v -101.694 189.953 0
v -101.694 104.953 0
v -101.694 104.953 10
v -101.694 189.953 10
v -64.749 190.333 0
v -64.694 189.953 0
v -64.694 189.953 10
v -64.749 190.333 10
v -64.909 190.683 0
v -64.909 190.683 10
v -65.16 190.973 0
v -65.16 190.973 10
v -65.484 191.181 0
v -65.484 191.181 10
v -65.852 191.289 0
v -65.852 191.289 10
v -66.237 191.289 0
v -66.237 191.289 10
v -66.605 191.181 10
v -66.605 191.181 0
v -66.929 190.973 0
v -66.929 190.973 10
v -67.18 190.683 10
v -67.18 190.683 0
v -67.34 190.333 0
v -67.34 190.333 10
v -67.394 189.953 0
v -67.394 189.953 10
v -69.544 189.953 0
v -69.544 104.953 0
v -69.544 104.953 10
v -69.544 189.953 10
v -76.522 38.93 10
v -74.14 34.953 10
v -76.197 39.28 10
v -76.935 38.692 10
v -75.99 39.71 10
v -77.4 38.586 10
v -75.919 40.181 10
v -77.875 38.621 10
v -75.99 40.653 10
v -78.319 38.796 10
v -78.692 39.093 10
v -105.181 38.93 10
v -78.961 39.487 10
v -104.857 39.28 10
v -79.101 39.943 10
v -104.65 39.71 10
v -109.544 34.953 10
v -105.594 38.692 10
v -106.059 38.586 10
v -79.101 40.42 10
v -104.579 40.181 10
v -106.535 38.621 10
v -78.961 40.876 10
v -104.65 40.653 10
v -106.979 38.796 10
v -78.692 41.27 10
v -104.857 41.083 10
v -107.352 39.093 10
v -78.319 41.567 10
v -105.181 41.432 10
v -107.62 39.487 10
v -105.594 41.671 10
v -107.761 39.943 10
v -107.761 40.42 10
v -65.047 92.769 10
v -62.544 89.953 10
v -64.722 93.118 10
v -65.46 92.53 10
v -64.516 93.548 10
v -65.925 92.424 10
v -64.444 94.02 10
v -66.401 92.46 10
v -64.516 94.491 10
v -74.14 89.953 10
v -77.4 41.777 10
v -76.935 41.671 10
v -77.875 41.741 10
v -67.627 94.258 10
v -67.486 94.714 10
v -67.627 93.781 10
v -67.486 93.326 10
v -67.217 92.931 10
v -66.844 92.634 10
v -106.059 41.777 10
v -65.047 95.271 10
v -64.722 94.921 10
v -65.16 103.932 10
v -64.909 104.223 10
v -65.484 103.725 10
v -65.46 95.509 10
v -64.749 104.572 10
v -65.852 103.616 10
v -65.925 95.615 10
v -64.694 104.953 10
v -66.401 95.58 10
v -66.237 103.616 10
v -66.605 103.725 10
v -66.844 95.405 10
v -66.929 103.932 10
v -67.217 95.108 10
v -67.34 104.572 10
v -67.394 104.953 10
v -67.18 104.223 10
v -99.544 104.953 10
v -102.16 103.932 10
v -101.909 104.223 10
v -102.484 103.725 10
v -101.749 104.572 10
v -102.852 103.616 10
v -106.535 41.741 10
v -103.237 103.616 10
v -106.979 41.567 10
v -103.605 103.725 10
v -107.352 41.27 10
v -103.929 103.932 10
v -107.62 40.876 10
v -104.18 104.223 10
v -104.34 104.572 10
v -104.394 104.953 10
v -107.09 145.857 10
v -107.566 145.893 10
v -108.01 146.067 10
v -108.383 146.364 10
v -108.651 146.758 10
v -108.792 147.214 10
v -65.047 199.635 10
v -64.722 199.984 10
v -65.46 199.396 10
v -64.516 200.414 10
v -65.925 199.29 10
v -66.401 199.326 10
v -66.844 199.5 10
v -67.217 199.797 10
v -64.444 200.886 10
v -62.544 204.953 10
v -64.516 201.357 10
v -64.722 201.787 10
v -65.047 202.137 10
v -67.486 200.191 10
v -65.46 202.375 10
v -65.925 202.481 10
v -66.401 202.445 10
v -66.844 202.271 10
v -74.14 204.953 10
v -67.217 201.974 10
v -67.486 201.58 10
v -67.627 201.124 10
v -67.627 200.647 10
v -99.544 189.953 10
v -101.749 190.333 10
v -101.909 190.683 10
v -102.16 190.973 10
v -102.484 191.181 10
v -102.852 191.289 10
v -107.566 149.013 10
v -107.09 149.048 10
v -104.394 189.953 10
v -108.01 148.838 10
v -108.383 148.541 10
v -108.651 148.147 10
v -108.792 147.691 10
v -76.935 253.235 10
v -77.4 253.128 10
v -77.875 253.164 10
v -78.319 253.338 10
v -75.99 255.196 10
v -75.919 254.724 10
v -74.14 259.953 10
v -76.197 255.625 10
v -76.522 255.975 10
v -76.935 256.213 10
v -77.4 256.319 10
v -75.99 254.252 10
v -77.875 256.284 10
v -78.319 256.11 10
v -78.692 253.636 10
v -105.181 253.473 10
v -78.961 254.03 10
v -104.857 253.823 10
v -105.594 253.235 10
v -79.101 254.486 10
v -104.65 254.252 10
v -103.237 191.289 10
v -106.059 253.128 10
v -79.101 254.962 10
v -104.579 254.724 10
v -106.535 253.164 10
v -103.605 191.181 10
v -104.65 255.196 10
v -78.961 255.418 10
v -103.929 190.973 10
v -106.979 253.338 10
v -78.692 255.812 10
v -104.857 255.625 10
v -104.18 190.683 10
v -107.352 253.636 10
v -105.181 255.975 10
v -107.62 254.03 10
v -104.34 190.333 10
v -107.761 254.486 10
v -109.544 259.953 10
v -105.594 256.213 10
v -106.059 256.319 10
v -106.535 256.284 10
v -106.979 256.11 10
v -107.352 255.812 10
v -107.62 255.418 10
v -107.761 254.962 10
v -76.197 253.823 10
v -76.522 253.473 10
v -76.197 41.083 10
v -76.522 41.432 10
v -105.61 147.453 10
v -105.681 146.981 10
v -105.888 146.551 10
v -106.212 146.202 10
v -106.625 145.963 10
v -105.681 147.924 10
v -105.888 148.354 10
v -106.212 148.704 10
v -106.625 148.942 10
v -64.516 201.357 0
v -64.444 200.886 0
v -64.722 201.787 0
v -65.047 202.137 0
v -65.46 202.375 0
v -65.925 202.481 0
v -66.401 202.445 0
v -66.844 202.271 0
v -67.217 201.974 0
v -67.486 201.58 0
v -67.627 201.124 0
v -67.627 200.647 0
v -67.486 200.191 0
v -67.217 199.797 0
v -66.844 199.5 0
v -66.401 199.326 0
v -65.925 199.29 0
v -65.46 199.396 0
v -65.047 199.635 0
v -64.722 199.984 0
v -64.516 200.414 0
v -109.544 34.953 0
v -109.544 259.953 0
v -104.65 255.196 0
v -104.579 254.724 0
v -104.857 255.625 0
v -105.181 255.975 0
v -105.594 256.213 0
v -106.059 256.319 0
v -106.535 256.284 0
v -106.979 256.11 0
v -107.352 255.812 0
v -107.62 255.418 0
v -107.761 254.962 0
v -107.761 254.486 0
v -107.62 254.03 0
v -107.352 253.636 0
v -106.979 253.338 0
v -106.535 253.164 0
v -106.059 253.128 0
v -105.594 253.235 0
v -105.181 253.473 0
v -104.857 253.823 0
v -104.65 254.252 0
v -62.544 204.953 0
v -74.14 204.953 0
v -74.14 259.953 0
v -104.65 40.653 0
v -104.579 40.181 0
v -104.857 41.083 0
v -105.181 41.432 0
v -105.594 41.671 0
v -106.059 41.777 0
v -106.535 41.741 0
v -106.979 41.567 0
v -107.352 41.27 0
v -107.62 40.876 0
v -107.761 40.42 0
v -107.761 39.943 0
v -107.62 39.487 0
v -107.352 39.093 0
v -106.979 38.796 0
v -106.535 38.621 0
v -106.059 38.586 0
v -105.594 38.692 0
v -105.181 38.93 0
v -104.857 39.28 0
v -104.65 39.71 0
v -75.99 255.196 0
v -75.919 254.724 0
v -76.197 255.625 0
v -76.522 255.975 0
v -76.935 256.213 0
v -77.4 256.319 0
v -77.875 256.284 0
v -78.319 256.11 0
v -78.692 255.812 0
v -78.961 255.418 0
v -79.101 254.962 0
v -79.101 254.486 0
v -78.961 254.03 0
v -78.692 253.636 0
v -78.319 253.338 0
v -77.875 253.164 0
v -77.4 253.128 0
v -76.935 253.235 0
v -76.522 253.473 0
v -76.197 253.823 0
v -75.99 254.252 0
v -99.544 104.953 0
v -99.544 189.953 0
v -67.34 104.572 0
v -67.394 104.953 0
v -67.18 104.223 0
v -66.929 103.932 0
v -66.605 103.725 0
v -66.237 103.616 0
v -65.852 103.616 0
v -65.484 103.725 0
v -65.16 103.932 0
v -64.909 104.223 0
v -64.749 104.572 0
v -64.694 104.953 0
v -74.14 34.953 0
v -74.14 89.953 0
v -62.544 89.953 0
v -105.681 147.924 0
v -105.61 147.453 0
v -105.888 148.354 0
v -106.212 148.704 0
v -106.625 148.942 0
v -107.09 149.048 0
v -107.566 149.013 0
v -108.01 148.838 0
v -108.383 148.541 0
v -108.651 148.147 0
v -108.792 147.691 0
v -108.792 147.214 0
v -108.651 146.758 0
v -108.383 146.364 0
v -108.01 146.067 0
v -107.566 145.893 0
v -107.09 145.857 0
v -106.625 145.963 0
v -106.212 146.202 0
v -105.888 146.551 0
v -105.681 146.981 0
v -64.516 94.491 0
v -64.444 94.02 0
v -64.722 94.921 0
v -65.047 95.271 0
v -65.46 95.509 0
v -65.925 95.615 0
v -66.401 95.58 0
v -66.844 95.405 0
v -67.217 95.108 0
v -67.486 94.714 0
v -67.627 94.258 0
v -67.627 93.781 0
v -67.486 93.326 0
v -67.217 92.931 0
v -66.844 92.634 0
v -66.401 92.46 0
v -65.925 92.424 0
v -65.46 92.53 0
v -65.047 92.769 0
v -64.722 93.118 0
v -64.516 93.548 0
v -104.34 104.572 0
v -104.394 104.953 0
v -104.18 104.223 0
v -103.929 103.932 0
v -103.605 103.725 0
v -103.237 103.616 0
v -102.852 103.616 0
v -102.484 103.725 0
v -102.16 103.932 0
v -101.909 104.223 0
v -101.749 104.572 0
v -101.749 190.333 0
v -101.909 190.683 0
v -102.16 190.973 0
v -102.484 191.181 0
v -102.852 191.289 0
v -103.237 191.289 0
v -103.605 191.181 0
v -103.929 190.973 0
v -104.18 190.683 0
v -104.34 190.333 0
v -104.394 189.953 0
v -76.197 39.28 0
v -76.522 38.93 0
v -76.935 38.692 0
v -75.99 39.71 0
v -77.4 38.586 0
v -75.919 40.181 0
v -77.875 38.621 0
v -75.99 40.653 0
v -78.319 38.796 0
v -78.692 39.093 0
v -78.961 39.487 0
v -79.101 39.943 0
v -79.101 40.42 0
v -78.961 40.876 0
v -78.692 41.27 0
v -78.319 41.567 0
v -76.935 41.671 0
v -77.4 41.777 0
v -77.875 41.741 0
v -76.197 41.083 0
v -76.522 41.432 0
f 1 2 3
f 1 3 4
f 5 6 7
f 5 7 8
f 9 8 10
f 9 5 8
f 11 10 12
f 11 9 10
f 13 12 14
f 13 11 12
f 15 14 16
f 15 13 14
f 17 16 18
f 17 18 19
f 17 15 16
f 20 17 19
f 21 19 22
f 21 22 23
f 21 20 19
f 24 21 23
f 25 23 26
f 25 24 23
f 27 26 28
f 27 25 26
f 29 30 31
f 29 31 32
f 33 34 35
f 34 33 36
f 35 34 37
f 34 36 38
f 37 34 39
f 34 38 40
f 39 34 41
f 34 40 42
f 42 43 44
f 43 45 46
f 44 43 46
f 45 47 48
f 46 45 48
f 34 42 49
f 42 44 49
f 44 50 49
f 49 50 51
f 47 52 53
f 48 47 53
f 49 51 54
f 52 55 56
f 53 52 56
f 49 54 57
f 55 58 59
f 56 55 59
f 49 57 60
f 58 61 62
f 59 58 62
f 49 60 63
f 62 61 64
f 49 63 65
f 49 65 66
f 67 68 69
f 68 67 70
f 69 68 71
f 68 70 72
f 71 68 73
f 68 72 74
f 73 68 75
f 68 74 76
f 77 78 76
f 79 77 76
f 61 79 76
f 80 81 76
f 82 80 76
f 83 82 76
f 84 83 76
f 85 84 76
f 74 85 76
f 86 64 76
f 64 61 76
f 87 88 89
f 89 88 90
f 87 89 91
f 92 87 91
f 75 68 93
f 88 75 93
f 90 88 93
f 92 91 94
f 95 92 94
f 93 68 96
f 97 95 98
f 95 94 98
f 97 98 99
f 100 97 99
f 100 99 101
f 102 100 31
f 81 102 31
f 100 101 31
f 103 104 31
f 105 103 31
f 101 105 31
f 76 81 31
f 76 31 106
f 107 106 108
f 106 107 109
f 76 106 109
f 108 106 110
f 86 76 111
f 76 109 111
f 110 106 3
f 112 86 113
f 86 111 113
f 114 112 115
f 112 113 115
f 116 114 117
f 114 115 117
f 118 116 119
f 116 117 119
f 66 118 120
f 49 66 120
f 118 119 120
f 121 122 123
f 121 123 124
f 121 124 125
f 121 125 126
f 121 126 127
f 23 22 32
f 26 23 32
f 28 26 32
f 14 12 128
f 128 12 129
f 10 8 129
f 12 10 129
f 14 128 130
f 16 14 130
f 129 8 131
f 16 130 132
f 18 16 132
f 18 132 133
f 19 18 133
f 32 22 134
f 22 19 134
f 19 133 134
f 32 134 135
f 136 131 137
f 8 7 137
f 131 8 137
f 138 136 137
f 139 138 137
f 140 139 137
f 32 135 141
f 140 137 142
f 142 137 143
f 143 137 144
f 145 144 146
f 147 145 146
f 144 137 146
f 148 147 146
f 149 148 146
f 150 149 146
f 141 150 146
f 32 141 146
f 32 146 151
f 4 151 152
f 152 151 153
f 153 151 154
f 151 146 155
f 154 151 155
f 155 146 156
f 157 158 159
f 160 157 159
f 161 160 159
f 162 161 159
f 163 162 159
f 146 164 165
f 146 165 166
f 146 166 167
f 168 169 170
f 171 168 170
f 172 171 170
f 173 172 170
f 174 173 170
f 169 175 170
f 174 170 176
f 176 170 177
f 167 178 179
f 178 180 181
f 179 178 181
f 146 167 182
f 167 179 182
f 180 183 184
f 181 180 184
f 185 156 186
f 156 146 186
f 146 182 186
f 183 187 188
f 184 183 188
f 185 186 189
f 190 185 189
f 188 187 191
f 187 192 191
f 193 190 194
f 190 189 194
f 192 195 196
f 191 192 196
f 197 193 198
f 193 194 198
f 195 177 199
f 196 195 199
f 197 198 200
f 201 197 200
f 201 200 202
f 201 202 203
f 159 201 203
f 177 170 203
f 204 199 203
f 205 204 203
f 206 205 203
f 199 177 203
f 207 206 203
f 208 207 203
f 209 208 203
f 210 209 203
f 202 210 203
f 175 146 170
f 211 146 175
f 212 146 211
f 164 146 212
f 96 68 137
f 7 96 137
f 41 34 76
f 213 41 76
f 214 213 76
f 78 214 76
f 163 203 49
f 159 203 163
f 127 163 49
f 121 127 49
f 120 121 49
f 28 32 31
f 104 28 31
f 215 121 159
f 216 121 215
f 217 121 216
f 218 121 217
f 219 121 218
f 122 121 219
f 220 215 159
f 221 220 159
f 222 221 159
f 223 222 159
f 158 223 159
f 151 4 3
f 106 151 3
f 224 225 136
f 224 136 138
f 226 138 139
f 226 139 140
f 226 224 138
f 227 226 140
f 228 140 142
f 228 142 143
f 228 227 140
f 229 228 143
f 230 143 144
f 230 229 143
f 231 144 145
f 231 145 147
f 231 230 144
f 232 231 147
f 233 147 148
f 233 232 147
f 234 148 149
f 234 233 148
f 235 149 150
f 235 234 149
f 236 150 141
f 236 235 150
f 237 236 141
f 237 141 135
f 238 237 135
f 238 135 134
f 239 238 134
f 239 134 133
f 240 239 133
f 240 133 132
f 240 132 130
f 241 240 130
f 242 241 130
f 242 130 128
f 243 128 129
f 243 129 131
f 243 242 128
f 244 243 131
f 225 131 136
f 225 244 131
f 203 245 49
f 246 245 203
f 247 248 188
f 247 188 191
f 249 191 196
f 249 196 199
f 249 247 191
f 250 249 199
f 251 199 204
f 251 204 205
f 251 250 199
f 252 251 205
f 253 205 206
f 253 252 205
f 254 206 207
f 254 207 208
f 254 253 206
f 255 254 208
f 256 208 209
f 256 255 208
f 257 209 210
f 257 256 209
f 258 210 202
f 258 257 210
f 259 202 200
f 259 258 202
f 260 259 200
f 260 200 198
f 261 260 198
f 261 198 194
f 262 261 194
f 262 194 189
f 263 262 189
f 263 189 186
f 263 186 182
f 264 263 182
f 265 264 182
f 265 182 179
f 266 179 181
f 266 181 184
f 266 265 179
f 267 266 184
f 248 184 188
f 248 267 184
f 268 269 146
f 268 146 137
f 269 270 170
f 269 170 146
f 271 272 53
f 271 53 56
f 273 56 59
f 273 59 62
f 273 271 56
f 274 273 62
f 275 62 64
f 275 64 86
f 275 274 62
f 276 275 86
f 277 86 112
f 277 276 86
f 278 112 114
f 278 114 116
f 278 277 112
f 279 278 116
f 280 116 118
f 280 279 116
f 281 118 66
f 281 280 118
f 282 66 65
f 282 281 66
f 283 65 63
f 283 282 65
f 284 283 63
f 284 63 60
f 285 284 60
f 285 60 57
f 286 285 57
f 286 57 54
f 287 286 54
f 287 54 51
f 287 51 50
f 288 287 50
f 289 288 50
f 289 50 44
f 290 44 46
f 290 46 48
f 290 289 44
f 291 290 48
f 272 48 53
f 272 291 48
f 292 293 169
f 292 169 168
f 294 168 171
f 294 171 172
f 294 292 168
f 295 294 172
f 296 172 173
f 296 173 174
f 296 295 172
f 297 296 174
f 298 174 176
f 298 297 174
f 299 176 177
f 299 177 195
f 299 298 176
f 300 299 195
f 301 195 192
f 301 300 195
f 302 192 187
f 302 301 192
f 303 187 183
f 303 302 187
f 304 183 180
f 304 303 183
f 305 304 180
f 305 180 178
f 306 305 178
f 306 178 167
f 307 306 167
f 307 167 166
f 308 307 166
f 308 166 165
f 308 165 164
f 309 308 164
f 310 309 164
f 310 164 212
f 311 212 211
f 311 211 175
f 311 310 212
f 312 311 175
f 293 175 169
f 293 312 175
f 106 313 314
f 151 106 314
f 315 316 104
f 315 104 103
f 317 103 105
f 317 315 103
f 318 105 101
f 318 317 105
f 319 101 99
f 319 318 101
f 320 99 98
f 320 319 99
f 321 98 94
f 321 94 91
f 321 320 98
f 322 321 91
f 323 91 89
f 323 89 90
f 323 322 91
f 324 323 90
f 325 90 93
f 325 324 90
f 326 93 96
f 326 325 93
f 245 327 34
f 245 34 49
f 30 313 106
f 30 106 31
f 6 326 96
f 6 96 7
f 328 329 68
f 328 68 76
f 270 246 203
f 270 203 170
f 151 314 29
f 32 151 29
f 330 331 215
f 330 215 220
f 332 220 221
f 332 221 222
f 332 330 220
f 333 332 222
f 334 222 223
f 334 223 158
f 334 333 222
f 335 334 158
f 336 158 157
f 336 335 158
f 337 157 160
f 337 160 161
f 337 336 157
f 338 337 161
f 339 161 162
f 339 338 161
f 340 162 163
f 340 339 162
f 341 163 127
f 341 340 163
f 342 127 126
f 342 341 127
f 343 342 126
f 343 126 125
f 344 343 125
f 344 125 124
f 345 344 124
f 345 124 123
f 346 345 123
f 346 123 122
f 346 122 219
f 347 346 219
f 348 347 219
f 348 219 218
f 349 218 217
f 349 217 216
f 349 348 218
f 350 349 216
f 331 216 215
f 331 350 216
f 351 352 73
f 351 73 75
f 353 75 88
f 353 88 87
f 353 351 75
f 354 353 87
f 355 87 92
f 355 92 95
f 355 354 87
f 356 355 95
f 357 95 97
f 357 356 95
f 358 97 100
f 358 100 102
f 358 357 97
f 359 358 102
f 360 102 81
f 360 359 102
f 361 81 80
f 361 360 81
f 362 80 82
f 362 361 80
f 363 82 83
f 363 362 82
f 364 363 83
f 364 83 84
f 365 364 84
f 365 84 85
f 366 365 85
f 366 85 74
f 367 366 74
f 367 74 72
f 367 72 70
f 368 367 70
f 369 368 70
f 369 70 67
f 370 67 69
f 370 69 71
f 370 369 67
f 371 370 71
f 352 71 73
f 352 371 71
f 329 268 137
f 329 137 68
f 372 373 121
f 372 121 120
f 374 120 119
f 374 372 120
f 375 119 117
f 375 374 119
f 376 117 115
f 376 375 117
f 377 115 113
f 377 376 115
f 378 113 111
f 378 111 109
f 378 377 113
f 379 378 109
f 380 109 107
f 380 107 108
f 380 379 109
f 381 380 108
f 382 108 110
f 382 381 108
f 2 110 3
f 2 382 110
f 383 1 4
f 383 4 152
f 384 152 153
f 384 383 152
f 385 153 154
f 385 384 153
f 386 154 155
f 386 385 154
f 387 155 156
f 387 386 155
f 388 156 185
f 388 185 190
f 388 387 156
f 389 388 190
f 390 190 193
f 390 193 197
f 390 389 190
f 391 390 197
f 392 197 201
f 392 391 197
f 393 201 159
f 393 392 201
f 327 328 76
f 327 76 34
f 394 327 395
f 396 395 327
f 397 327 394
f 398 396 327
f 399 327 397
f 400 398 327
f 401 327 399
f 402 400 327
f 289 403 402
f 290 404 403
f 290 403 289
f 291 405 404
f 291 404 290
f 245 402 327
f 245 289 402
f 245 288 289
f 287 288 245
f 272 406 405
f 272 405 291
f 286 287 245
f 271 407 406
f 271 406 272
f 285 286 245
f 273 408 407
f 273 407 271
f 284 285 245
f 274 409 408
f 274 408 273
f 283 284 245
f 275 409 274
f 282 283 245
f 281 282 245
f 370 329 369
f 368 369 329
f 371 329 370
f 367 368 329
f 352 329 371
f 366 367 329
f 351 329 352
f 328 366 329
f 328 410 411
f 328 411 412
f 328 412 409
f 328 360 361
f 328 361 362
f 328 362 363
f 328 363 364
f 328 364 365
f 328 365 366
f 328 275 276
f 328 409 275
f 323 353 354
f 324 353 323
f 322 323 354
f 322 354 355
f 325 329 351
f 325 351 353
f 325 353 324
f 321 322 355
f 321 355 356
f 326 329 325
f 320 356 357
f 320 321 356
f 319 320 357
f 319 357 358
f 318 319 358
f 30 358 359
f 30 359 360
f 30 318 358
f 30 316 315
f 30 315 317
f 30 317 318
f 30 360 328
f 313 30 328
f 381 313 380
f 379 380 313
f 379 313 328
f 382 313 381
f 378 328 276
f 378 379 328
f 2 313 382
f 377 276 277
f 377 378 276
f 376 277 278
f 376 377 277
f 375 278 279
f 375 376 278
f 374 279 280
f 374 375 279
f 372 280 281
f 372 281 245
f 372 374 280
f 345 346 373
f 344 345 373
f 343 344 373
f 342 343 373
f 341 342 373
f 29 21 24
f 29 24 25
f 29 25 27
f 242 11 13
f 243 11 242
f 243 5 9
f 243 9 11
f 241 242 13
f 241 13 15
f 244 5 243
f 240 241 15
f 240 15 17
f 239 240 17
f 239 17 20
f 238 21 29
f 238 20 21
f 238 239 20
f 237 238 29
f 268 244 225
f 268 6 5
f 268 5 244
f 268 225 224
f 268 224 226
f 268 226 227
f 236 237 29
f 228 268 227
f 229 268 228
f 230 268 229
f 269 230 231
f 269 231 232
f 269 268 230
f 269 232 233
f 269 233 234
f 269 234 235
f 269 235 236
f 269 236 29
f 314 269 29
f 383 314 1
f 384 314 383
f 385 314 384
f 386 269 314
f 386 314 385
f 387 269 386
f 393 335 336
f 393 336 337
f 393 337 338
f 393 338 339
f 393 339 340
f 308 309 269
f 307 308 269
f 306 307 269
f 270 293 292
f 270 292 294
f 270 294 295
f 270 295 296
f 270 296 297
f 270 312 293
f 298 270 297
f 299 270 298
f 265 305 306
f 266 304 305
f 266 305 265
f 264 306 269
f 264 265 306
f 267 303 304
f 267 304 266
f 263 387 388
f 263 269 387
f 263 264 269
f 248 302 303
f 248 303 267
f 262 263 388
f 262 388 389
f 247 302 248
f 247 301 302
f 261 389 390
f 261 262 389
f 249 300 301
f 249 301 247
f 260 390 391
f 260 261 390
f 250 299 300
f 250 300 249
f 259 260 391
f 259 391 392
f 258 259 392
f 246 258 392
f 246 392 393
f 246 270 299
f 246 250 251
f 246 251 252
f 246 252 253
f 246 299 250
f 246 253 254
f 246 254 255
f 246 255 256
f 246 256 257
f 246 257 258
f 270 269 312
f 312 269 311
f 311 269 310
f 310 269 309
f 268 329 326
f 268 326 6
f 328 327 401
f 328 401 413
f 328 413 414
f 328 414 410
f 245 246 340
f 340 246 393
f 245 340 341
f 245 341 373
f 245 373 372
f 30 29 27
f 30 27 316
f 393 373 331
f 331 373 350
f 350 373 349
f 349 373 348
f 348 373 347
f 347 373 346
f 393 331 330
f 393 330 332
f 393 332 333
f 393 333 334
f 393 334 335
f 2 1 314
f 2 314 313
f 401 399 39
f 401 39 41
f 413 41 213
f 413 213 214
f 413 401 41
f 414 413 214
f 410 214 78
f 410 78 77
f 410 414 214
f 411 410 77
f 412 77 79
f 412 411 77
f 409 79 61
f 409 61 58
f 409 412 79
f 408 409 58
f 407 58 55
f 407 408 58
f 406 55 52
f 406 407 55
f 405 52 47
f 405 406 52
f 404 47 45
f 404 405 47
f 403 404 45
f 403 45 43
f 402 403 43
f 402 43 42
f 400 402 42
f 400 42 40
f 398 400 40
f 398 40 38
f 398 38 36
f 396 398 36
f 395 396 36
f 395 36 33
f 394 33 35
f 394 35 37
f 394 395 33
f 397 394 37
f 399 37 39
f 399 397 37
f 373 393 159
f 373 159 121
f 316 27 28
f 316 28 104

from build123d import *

# Parameters (mm, degrees)
SKETCH4_R           = 1.6
SKETCH4_W           = 30
SKETCH4_H           = 85
BOSS_EXTRUDE6_DEPTH = 10


with BuildPart() as part:
    # Sketch4 → Boss-Extrude6 (new body)
    with BuildSketch(Plane.XY):
        Polygon((-109.544479684, 259.95267573), (-74.140420057, 259.95267573), (-74.140420057, 204.95267573), (-62.544479684, 204.95267573), (-62.544479684, 89.95267573), (-74.140420057, 89.95267573), (-74.140420057, 34.95267573), (-109.544479684, 34.95267573), align=None)
        with Locations((-77.519250358, 254.723971913)):
            Circle(SKETCH4_R, mode=Mode.SUBTRACT)
        with Locations((-106.178709835, 40.181379546)):
            Circle(SKETCH4_R, mode=Mode.SUBTRACT)
        with Locations((-77.519250358, 40.181379546)):
            Circle(SKETCH4_R, mode=Mode.SUBTRACT)
        with Locations((-66.044479684, 94.019745429)):
            Circle(SKETCH4_R, mode=Mode.SUBTRACT)
        with Locations((-107.209755901, 147.45267573)):
            Circle(SKETCH4_R, mode=Mode.SUBTRACT)
        with Locations((-66.044479684, 200.885606031)):
            Circle(SKETCH4_R, mode=Mode.SUBTRACT)
        with Locations((-106.178709835, 254.723971913)):
            Circle(SKETCH4_R, mode=Mode.SUBTRACT)
        with Locations((-84.544479684, 147.45267573)):
            Rectangle(SKETCH4_W, SKETCH4_H, mode=Mode.SUBTRACT)
        with BuildLine():
            Line((-67.394479684, 189.95267573), (-67.394479684, 147.45267573))
            Line((-67.394479684, 147.45267573), (-67.394479684, 104.95267573))
            ThreePointArc((-67.394479684, 104.95267573), (-66.044479684, 103.60267573), (-64.694479684, 104.95267573))
            Line((-64.694479684, 104.95267573), (-64.694479684, 147.45267573))
            Line((-64.694479684, 147.45267573), (-64.694479684, 189.95267573))
            ThreePointArc((-64.694479684, 189.95267573), (-66.044479684, 191.30267573), (-67.394479684, 189.95267573))
        make_face(mode=Mode.SUBTRACT)
        with BuildLine():
            Line((-104.394479684, 189.95267573), (-104.394479684, 147.45267573))
            Line((-104.394479684, 147.45267573), (-104.394479684, 104.95267573))
            ThreePointArc((-104.394479684, 104.95267573), (-103.044479684, 103.60267573), (-101.694479684, 104.95267573))
            Line((-101.694479684, 104.95267573), (-101.694479684, 147.45267573))
            Line((-101.694479684, 147.45267573), (-101.694479684, 189.95267573))
            ThreePointArc((-101.694479684, 189.95267573), (-103.044479684, 191.30267573), (-104.394479684, 189.95267573))
        make_face(mode=Mode.SUBTRACT)
    extrude(amount=BOSS_EXTRUDE6_DEPTH)


solid = part.part
